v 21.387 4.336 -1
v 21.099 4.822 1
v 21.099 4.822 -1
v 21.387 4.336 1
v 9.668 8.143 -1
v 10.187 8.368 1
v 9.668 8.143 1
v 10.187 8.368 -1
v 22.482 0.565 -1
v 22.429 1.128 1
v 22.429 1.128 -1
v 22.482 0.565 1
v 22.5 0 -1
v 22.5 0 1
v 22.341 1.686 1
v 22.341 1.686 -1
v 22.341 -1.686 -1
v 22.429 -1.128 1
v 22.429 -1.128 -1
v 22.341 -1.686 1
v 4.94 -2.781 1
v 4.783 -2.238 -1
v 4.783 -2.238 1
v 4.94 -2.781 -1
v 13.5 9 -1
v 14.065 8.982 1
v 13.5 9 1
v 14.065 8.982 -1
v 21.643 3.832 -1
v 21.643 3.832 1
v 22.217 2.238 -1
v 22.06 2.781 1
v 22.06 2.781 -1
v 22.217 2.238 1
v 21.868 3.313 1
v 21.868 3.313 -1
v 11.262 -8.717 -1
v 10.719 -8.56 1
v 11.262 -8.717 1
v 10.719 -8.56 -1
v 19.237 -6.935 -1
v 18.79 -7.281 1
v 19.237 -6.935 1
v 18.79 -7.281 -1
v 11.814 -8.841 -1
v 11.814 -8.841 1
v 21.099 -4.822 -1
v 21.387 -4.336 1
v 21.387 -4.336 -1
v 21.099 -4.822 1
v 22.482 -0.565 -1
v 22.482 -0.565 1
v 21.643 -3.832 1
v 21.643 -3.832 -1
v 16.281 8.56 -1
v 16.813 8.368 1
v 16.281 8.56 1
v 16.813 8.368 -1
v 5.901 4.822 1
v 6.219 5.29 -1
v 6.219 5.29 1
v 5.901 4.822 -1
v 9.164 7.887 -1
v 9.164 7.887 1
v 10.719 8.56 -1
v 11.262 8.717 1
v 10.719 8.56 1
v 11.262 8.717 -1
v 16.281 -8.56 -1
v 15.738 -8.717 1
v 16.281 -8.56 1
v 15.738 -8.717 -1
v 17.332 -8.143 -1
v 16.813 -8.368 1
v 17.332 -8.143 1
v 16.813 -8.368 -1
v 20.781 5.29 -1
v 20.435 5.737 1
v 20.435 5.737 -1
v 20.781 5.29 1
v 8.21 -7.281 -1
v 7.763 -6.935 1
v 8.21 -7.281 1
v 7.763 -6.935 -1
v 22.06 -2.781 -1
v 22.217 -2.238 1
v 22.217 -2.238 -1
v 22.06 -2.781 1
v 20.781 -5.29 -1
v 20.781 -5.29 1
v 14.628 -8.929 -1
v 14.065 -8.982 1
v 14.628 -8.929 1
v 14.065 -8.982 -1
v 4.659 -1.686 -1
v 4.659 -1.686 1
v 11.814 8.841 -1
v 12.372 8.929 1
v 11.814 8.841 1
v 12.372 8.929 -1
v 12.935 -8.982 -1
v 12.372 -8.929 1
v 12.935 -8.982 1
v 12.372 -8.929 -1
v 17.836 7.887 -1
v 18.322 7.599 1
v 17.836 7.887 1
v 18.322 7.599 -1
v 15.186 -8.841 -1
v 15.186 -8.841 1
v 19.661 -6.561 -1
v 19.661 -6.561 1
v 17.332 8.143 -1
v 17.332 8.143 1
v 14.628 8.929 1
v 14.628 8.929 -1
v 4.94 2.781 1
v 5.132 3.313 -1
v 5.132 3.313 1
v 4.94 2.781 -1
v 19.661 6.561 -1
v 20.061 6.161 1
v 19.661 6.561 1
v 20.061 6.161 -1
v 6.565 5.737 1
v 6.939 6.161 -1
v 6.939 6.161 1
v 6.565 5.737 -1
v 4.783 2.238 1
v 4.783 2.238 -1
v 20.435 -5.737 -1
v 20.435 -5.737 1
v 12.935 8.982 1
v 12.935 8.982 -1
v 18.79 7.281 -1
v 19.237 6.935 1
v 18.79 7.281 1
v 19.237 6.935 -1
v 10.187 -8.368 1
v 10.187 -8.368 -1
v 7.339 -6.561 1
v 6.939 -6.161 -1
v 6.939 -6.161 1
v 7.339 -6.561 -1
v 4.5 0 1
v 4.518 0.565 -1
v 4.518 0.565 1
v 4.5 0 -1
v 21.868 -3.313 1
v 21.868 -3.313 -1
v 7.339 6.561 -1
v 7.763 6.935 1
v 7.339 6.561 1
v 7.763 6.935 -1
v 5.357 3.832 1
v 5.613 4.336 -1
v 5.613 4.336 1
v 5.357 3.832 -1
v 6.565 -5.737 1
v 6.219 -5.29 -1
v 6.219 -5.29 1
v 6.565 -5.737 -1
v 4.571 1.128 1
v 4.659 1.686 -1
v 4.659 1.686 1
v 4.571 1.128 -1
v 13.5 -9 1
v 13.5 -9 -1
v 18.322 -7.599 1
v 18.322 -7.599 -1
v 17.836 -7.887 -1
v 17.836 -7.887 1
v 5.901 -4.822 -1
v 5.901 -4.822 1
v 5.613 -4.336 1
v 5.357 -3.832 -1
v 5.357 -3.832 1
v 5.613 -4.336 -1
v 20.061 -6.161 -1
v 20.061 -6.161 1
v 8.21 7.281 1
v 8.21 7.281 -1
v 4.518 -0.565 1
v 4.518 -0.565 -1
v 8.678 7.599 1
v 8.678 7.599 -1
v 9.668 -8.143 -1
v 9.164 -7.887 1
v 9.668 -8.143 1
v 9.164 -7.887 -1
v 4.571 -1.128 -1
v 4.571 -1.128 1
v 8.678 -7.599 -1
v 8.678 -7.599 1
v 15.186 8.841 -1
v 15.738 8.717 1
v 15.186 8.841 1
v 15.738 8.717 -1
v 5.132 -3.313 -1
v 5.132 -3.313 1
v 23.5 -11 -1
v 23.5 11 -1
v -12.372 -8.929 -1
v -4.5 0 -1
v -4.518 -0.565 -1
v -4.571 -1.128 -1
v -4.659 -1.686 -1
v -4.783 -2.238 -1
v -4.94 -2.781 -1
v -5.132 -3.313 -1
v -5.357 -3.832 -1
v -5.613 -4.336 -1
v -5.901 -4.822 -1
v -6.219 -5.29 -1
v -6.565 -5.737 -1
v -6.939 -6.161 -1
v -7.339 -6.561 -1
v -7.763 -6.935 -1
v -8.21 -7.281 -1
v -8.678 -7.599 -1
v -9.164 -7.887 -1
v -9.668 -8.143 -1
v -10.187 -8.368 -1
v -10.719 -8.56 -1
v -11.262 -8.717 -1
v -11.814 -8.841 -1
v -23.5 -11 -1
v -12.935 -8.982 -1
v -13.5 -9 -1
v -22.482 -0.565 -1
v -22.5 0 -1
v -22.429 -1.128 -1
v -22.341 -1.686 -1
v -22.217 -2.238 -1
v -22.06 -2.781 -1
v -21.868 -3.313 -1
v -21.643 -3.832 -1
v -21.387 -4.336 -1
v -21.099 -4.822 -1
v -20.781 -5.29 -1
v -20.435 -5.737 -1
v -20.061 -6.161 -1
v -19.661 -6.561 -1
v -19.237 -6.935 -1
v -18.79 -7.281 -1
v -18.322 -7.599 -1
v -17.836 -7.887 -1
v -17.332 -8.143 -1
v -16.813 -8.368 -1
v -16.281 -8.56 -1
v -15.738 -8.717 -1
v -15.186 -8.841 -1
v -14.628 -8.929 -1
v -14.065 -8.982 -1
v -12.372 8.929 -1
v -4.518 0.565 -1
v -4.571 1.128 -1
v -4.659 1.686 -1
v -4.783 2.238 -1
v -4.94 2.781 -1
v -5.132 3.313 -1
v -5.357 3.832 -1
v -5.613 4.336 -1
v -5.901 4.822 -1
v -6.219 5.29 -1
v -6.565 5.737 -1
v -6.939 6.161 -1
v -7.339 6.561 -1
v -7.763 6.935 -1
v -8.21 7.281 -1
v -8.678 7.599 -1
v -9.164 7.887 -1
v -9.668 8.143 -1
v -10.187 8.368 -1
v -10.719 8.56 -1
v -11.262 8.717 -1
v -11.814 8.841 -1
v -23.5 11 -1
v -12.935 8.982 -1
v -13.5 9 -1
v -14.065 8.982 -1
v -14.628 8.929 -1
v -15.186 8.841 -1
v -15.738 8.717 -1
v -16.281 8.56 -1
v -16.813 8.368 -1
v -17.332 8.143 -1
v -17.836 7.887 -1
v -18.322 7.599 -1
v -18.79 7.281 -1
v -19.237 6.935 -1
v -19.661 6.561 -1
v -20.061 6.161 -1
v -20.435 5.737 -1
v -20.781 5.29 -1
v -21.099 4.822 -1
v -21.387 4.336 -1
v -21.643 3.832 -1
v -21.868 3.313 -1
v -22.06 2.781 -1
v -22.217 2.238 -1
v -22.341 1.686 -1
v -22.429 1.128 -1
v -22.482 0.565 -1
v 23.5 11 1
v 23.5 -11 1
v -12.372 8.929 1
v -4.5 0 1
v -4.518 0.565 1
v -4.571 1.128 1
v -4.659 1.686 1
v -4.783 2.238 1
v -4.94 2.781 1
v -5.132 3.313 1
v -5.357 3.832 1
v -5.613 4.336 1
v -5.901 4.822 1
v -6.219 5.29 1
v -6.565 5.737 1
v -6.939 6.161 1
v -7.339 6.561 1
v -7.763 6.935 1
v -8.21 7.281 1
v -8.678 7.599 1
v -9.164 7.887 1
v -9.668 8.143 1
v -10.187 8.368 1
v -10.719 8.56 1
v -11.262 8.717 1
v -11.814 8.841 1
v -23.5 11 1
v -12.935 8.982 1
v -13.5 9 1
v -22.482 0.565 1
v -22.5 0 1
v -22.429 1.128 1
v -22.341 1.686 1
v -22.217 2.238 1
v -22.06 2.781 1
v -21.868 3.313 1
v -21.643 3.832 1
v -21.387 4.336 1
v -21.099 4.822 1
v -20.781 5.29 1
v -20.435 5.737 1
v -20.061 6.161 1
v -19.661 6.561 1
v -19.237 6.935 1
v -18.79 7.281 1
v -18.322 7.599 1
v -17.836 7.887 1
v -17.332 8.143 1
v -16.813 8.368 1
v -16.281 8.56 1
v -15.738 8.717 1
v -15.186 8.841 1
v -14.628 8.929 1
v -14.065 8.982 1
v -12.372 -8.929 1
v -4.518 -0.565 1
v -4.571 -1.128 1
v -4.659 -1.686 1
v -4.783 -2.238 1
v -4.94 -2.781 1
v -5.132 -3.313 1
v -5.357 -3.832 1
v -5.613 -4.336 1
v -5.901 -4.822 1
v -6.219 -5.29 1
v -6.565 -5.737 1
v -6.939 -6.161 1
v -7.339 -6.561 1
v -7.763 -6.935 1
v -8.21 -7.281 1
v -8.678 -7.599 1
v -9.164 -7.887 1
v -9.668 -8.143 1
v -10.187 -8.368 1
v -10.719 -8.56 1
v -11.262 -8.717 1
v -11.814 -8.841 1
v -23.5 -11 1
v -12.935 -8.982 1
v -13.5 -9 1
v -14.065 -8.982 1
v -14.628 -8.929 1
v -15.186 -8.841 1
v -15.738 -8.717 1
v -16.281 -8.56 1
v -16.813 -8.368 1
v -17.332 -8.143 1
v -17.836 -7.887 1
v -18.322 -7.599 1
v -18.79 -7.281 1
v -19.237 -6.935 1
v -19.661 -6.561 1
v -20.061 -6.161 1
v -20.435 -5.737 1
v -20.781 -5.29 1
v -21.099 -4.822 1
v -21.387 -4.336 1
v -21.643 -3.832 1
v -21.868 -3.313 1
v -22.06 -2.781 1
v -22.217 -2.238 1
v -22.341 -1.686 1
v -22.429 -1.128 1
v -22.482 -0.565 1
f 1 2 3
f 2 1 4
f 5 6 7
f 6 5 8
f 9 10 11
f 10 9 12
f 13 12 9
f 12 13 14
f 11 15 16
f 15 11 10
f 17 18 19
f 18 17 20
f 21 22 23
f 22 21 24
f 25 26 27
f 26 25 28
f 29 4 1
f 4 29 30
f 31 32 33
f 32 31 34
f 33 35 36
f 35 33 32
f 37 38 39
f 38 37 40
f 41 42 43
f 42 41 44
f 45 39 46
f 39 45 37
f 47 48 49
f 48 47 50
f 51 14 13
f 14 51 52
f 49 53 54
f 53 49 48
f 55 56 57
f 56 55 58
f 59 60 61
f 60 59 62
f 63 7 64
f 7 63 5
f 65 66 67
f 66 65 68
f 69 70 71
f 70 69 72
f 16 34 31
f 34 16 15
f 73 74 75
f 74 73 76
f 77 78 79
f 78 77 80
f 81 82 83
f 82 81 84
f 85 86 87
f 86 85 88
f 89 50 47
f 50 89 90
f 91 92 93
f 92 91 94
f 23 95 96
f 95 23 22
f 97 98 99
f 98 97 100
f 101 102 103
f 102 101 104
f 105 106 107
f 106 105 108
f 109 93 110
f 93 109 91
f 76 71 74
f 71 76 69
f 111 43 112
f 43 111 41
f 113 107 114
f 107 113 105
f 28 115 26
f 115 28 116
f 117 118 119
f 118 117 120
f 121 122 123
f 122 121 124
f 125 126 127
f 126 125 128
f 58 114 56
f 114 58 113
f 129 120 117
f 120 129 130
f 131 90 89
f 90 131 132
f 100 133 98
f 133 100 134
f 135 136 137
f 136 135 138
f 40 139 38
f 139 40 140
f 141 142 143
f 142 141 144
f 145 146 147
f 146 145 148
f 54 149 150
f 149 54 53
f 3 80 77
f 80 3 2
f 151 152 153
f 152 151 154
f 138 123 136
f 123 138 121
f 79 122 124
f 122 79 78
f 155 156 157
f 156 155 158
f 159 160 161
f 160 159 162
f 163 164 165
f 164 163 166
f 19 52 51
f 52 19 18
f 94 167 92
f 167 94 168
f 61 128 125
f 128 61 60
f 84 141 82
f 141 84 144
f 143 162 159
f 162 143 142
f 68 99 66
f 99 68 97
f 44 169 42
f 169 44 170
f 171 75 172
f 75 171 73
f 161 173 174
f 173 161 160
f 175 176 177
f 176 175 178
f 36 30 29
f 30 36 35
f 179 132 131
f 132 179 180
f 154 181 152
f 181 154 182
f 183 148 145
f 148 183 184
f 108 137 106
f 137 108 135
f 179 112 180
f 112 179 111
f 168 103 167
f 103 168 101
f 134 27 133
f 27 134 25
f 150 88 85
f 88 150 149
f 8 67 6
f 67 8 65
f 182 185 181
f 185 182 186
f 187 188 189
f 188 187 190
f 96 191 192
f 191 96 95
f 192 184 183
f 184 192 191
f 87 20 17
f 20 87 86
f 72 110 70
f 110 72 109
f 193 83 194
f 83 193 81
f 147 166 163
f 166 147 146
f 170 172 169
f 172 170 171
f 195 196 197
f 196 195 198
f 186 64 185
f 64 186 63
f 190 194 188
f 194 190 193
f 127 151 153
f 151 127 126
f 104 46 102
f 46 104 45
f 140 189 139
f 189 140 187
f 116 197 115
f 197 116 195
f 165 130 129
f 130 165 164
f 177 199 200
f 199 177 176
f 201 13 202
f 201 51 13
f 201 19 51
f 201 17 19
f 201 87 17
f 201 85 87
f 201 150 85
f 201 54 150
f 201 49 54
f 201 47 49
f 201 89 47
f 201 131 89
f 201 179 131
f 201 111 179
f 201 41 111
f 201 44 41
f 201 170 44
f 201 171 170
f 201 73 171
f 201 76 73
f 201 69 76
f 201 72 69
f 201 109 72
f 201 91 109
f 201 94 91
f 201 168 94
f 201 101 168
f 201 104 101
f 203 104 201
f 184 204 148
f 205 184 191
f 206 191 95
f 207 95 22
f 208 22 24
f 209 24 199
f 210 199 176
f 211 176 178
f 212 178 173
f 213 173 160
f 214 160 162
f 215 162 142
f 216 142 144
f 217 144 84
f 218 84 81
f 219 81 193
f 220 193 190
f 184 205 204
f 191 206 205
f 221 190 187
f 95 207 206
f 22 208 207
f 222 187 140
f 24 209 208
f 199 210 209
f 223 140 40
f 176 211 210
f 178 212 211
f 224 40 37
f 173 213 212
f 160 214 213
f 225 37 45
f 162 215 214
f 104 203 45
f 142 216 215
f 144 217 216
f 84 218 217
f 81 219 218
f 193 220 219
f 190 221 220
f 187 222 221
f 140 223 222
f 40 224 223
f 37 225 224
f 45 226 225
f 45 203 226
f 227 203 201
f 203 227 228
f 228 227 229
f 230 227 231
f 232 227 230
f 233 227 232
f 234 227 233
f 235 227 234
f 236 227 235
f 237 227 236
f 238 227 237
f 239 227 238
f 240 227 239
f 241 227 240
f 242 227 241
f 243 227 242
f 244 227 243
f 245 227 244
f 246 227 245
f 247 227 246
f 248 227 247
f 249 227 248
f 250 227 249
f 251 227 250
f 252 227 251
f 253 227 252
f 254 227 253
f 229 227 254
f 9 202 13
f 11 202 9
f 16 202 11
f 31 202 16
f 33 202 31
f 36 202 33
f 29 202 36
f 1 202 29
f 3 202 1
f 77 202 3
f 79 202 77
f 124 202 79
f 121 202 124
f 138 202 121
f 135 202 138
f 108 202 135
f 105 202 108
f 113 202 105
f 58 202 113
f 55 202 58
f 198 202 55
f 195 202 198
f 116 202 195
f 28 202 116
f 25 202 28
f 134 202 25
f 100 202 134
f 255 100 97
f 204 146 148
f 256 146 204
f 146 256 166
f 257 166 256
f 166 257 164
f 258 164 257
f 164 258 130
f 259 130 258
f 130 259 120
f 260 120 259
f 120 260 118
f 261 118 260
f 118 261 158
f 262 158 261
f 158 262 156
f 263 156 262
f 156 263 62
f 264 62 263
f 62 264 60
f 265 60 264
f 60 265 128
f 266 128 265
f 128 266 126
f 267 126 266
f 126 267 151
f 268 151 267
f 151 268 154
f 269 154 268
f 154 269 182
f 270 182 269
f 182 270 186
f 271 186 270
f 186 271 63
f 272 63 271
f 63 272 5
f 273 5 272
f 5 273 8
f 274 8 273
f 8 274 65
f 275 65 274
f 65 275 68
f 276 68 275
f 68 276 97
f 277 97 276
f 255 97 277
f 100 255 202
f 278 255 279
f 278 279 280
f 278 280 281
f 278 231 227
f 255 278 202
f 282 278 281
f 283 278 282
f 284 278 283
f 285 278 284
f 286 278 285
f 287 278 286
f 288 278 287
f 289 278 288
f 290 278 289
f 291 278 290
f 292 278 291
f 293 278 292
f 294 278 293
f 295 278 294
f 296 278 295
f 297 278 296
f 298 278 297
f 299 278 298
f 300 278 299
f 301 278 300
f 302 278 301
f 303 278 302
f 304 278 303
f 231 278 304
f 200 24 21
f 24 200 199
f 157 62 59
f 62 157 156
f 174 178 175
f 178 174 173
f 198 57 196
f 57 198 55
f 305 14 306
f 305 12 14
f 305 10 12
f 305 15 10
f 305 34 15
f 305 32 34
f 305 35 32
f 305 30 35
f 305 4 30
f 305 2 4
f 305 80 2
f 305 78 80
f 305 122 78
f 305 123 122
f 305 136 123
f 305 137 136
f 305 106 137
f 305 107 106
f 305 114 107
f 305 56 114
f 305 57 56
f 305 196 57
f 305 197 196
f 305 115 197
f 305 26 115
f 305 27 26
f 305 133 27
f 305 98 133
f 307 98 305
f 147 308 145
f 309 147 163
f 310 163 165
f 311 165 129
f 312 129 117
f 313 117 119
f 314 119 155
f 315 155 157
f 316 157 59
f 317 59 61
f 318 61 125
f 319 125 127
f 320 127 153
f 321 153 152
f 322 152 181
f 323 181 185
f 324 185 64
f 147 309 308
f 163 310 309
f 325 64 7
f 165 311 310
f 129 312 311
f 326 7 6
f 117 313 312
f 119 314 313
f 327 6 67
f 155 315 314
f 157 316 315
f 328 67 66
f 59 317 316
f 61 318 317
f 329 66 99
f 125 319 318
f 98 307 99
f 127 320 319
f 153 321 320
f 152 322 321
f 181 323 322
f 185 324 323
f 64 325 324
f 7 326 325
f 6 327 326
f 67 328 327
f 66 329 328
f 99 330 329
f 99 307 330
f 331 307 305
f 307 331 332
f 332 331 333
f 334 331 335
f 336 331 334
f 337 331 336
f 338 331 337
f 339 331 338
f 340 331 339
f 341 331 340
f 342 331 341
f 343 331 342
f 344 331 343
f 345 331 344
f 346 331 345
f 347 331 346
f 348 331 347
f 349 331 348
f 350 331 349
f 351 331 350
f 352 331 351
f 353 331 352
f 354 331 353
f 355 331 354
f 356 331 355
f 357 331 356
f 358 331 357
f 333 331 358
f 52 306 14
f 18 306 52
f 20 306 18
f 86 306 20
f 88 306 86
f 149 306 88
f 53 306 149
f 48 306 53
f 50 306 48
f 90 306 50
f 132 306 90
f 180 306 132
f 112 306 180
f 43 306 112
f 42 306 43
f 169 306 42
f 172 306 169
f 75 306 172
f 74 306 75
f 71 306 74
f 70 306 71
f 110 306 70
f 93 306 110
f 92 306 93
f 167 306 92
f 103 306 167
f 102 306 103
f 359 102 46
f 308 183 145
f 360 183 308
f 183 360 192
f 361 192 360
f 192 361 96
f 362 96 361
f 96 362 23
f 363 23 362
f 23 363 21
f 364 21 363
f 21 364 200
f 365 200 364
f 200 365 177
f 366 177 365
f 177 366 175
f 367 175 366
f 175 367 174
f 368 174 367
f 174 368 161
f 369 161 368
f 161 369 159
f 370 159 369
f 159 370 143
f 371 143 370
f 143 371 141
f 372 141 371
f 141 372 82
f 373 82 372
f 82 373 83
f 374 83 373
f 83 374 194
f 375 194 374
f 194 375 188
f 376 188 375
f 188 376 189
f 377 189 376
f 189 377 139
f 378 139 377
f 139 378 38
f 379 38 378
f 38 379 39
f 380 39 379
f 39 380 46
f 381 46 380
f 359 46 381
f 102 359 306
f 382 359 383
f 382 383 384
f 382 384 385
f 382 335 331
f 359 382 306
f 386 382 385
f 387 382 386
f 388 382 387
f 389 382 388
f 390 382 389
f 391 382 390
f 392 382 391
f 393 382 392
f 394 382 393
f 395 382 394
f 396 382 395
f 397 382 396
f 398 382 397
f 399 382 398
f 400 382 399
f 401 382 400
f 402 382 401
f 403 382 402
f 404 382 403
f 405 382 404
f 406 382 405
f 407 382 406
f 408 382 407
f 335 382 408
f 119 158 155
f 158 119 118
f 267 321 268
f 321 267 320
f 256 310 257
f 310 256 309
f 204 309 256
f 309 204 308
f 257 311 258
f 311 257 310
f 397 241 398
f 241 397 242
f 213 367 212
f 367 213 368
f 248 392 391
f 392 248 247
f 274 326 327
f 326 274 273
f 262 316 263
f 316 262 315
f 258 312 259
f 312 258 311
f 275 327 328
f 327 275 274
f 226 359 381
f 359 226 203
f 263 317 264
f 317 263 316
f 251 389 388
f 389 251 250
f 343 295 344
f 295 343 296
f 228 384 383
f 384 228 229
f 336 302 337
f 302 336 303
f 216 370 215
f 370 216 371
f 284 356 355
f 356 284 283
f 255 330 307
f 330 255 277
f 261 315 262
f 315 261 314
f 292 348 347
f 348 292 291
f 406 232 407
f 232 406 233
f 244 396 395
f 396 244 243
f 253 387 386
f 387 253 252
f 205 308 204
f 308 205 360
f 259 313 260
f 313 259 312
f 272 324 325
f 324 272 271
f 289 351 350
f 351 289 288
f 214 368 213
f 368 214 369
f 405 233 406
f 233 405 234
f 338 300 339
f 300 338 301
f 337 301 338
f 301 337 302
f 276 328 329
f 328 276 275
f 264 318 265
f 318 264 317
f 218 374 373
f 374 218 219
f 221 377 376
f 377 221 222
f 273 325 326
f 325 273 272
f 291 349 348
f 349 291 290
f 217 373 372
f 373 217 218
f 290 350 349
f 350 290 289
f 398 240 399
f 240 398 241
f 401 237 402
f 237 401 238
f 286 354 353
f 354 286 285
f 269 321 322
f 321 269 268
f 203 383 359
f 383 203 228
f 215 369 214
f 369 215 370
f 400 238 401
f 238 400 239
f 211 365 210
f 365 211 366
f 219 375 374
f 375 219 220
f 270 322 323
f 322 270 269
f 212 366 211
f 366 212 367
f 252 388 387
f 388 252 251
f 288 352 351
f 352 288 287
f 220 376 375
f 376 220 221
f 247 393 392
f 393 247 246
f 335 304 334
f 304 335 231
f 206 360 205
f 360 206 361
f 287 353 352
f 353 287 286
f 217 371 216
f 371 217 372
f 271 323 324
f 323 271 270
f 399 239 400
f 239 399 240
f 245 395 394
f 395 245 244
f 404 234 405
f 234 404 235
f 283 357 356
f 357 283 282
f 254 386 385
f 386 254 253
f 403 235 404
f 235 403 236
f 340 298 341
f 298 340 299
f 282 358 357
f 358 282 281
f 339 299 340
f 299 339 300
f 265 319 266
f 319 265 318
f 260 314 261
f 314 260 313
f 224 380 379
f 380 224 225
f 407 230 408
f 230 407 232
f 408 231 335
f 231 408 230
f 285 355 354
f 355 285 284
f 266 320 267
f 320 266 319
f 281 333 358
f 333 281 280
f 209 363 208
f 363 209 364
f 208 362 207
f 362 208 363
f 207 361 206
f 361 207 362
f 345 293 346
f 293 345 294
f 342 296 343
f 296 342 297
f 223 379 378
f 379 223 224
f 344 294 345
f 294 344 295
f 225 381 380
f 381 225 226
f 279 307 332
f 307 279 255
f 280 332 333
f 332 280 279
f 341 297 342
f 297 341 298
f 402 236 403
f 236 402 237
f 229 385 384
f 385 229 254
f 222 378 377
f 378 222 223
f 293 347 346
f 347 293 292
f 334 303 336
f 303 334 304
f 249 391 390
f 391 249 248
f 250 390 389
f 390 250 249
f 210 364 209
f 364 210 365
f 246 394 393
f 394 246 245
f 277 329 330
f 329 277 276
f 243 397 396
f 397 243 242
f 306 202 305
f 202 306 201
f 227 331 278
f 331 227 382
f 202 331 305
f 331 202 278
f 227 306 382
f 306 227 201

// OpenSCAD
// Making a container for the HC-sr04
$fn=100;

thickness=2;
width=45;
height=20;
sonic_r=8;

padding=2;

difference(){
    cube([width+padding,height+padding,thickness], center=true);

    union(){
        translate([13.5,0,-thickness/2]) cylinder(h=thickness,r=sonic_r+padding/2);
        translate([-13.5,0,-thickness/2]) cylinder(h=thickness,r=sonic_r+padding/2);
    }
}
